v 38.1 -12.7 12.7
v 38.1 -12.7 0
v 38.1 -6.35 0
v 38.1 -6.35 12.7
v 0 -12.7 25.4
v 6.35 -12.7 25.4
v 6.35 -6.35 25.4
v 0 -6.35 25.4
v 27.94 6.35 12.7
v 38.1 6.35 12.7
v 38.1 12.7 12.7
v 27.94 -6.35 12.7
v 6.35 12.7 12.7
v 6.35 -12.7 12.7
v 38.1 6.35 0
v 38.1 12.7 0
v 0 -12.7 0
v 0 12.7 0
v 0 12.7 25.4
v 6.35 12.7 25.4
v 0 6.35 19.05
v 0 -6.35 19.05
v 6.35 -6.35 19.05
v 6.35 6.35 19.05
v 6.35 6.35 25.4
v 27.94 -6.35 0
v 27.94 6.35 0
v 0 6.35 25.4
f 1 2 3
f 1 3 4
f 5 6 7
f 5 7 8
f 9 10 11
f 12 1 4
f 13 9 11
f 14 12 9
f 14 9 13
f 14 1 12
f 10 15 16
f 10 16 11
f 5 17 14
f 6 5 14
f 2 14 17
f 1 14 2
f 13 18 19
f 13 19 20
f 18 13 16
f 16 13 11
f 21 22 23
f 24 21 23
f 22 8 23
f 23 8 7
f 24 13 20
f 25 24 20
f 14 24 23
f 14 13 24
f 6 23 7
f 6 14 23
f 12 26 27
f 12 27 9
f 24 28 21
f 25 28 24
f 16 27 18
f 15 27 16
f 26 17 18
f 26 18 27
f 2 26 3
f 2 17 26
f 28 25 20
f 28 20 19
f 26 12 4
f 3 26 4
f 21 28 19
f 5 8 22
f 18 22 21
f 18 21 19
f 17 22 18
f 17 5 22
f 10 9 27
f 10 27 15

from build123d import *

# Parameters (mm, degrees)
F1_DEPTH = 12.7
F3_START = -6.35
F2_W     = 10.1600005239
F2_H     = 12.7
F3_DEPTH = 12.7
F5_START = -6.35
F4_W     = 6.35
F4_H     = 6.35
F5_DEPTH = 12.7


with BuildPart() as f1:
    # F0 (on Front) → F1 (new body, symmetric)
    with BuildSketch(Plane.XZ):
        Polygon((0, 25.4), (0, 0), (38.1, 0), (38.1, 12.7), (6.35, 12.7), (6.35, 25.4), align=None)
    extrude(amount=F1_DEPTH, both=True)

    # F2 (on face) → F3 (cut)
    with BuildSketch(Plane.XZ.offset(12.7).offset(F3_START)):
        with Locations((33.019999738, 6.35)):
            Rectangle(F2_W, F2_H)
    extrude(amount=-F3_DEPTH, mode=Mode.SUBTRACT)

    # F4 (on face) → F5 (cut)
    with BuildSketch(Plane.XZ.offset(12.7).offset(F5_START)):
        with Locations((3.175, 22.225)):
            Rectangle(F4_W, F4_H)
    extrude(amount=-F5_DEPTH, mode=Mode.SUBTRACT)


solid = f1.part
